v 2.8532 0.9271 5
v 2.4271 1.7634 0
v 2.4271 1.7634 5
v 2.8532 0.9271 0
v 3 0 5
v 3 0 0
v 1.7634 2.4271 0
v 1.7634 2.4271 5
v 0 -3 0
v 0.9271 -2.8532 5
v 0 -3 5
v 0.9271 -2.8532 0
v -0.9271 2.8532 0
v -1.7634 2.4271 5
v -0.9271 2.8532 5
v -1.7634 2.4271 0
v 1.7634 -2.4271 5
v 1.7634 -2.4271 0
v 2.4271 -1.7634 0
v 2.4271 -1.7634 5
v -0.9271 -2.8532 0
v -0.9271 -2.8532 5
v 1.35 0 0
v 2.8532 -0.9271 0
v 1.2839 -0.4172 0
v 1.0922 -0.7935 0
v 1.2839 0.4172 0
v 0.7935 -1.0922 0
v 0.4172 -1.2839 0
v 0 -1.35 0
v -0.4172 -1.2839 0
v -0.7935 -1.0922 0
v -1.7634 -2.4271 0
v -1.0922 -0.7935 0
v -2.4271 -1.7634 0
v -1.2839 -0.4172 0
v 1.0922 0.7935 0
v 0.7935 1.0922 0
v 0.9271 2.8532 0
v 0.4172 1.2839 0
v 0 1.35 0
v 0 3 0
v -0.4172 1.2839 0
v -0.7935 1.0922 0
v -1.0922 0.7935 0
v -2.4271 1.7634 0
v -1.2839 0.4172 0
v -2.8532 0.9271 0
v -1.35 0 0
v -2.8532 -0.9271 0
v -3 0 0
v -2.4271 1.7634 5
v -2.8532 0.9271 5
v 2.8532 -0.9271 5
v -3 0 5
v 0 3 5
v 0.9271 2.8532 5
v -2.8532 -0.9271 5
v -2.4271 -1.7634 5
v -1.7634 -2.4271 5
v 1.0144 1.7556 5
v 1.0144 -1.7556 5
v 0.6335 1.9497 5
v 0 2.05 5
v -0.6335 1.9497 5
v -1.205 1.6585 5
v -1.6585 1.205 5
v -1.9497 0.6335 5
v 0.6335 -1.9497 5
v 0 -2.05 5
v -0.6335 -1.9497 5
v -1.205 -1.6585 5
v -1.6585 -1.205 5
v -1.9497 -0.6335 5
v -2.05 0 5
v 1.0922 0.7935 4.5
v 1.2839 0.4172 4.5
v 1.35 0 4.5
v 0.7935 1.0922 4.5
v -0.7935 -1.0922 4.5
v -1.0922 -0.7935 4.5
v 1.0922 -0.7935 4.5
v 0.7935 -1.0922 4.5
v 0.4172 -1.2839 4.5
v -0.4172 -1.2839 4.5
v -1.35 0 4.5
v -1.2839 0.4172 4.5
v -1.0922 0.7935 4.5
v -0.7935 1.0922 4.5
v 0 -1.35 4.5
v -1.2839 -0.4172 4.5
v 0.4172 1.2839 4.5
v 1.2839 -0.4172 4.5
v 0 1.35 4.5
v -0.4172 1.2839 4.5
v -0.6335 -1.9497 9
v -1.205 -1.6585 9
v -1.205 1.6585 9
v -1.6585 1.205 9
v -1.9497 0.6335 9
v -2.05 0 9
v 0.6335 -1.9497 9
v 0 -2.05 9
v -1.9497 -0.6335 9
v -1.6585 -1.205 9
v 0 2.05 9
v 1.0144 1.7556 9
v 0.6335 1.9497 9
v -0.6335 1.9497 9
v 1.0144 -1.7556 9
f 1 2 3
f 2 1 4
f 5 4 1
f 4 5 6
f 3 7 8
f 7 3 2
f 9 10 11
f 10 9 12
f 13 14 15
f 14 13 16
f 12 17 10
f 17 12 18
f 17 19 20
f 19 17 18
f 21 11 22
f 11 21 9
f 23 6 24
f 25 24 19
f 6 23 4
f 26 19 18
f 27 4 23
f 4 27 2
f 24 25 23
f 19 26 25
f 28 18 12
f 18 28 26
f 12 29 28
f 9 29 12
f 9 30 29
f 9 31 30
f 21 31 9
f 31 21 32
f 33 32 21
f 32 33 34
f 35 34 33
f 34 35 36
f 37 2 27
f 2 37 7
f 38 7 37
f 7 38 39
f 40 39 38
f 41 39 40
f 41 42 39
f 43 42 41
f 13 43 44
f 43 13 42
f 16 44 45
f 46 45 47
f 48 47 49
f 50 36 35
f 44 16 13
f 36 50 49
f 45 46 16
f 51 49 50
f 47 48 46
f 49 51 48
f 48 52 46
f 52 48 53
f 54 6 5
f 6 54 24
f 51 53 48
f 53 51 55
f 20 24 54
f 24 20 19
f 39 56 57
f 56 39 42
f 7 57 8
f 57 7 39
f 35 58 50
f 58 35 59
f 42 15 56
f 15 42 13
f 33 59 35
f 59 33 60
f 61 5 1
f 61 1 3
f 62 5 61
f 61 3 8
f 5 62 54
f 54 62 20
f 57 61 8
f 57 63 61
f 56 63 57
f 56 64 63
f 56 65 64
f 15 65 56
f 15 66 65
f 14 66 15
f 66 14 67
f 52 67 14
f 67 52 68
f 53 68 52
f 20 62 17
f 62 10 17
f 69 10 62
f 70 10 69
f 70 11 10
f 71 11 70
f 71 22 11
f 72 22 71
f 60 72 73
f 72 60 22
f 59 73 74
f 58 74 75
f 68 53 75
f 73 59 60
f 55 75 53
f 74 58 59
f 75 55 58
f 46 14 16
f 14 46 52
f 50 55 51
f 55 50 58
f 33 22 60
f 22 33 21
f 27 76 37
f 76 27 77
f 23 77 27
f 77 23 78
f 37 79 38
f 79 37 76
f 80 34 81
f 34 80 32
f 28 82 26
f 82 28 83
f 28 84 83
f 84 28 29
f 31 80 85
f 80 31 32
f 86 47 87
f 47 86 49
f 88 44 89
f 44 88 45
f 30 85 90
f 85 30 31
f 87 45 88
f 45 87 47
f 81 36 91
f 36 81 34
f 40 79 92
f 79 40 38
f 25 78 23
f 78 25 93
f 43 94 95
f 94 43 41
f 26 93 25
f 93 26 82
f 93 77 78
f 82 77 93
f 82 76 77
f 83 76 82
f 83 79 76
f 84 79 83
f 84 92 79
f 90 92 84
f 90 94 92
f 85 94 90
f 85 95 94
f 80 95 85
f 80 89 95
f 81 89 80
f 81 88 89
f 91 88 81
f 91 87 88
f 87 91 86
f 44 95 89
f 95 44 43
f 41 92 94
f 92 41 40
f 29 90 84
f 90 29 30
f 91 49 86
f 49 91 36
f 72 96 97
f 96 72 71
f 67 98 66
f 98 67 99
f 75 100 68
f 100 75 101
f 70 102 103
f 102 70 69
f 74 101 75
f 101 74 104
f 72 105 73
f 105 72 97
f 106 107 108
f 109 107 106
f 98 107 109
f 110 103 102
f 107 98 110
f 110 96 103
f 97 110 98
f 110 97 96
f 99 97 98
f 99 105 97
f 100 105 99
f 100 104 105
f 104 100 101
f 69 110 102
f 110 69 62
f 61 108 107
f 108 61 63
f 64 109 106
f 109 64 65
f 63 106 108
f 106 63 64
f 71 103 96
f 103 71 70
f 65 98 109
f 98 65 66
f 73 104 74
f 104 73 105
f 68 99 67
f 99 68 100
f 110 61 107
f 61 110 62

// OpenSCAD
h_b  = 5.0;
r_b  = 6.0 / 2;
r_dr = 2.7 / 2;

h_s = 4.0;
r_s = 4.1 / 2;
alp_s = 49.12;
x_s = 1.55 * cos( alp_s );

$fn=20;

union() {
  difference() {
    cylinder( h=h_b, r=r_b );
    cylinder( h=h_b-0.5, r=r_dr );
  }
  difference() {
    translate( [0,0,h_b] ) cylinder( h=h_s, r=r_s );
    translate( [x_s,-5,h_b] ) cube( [10, 10, h_s+0.1] );
  }
}
